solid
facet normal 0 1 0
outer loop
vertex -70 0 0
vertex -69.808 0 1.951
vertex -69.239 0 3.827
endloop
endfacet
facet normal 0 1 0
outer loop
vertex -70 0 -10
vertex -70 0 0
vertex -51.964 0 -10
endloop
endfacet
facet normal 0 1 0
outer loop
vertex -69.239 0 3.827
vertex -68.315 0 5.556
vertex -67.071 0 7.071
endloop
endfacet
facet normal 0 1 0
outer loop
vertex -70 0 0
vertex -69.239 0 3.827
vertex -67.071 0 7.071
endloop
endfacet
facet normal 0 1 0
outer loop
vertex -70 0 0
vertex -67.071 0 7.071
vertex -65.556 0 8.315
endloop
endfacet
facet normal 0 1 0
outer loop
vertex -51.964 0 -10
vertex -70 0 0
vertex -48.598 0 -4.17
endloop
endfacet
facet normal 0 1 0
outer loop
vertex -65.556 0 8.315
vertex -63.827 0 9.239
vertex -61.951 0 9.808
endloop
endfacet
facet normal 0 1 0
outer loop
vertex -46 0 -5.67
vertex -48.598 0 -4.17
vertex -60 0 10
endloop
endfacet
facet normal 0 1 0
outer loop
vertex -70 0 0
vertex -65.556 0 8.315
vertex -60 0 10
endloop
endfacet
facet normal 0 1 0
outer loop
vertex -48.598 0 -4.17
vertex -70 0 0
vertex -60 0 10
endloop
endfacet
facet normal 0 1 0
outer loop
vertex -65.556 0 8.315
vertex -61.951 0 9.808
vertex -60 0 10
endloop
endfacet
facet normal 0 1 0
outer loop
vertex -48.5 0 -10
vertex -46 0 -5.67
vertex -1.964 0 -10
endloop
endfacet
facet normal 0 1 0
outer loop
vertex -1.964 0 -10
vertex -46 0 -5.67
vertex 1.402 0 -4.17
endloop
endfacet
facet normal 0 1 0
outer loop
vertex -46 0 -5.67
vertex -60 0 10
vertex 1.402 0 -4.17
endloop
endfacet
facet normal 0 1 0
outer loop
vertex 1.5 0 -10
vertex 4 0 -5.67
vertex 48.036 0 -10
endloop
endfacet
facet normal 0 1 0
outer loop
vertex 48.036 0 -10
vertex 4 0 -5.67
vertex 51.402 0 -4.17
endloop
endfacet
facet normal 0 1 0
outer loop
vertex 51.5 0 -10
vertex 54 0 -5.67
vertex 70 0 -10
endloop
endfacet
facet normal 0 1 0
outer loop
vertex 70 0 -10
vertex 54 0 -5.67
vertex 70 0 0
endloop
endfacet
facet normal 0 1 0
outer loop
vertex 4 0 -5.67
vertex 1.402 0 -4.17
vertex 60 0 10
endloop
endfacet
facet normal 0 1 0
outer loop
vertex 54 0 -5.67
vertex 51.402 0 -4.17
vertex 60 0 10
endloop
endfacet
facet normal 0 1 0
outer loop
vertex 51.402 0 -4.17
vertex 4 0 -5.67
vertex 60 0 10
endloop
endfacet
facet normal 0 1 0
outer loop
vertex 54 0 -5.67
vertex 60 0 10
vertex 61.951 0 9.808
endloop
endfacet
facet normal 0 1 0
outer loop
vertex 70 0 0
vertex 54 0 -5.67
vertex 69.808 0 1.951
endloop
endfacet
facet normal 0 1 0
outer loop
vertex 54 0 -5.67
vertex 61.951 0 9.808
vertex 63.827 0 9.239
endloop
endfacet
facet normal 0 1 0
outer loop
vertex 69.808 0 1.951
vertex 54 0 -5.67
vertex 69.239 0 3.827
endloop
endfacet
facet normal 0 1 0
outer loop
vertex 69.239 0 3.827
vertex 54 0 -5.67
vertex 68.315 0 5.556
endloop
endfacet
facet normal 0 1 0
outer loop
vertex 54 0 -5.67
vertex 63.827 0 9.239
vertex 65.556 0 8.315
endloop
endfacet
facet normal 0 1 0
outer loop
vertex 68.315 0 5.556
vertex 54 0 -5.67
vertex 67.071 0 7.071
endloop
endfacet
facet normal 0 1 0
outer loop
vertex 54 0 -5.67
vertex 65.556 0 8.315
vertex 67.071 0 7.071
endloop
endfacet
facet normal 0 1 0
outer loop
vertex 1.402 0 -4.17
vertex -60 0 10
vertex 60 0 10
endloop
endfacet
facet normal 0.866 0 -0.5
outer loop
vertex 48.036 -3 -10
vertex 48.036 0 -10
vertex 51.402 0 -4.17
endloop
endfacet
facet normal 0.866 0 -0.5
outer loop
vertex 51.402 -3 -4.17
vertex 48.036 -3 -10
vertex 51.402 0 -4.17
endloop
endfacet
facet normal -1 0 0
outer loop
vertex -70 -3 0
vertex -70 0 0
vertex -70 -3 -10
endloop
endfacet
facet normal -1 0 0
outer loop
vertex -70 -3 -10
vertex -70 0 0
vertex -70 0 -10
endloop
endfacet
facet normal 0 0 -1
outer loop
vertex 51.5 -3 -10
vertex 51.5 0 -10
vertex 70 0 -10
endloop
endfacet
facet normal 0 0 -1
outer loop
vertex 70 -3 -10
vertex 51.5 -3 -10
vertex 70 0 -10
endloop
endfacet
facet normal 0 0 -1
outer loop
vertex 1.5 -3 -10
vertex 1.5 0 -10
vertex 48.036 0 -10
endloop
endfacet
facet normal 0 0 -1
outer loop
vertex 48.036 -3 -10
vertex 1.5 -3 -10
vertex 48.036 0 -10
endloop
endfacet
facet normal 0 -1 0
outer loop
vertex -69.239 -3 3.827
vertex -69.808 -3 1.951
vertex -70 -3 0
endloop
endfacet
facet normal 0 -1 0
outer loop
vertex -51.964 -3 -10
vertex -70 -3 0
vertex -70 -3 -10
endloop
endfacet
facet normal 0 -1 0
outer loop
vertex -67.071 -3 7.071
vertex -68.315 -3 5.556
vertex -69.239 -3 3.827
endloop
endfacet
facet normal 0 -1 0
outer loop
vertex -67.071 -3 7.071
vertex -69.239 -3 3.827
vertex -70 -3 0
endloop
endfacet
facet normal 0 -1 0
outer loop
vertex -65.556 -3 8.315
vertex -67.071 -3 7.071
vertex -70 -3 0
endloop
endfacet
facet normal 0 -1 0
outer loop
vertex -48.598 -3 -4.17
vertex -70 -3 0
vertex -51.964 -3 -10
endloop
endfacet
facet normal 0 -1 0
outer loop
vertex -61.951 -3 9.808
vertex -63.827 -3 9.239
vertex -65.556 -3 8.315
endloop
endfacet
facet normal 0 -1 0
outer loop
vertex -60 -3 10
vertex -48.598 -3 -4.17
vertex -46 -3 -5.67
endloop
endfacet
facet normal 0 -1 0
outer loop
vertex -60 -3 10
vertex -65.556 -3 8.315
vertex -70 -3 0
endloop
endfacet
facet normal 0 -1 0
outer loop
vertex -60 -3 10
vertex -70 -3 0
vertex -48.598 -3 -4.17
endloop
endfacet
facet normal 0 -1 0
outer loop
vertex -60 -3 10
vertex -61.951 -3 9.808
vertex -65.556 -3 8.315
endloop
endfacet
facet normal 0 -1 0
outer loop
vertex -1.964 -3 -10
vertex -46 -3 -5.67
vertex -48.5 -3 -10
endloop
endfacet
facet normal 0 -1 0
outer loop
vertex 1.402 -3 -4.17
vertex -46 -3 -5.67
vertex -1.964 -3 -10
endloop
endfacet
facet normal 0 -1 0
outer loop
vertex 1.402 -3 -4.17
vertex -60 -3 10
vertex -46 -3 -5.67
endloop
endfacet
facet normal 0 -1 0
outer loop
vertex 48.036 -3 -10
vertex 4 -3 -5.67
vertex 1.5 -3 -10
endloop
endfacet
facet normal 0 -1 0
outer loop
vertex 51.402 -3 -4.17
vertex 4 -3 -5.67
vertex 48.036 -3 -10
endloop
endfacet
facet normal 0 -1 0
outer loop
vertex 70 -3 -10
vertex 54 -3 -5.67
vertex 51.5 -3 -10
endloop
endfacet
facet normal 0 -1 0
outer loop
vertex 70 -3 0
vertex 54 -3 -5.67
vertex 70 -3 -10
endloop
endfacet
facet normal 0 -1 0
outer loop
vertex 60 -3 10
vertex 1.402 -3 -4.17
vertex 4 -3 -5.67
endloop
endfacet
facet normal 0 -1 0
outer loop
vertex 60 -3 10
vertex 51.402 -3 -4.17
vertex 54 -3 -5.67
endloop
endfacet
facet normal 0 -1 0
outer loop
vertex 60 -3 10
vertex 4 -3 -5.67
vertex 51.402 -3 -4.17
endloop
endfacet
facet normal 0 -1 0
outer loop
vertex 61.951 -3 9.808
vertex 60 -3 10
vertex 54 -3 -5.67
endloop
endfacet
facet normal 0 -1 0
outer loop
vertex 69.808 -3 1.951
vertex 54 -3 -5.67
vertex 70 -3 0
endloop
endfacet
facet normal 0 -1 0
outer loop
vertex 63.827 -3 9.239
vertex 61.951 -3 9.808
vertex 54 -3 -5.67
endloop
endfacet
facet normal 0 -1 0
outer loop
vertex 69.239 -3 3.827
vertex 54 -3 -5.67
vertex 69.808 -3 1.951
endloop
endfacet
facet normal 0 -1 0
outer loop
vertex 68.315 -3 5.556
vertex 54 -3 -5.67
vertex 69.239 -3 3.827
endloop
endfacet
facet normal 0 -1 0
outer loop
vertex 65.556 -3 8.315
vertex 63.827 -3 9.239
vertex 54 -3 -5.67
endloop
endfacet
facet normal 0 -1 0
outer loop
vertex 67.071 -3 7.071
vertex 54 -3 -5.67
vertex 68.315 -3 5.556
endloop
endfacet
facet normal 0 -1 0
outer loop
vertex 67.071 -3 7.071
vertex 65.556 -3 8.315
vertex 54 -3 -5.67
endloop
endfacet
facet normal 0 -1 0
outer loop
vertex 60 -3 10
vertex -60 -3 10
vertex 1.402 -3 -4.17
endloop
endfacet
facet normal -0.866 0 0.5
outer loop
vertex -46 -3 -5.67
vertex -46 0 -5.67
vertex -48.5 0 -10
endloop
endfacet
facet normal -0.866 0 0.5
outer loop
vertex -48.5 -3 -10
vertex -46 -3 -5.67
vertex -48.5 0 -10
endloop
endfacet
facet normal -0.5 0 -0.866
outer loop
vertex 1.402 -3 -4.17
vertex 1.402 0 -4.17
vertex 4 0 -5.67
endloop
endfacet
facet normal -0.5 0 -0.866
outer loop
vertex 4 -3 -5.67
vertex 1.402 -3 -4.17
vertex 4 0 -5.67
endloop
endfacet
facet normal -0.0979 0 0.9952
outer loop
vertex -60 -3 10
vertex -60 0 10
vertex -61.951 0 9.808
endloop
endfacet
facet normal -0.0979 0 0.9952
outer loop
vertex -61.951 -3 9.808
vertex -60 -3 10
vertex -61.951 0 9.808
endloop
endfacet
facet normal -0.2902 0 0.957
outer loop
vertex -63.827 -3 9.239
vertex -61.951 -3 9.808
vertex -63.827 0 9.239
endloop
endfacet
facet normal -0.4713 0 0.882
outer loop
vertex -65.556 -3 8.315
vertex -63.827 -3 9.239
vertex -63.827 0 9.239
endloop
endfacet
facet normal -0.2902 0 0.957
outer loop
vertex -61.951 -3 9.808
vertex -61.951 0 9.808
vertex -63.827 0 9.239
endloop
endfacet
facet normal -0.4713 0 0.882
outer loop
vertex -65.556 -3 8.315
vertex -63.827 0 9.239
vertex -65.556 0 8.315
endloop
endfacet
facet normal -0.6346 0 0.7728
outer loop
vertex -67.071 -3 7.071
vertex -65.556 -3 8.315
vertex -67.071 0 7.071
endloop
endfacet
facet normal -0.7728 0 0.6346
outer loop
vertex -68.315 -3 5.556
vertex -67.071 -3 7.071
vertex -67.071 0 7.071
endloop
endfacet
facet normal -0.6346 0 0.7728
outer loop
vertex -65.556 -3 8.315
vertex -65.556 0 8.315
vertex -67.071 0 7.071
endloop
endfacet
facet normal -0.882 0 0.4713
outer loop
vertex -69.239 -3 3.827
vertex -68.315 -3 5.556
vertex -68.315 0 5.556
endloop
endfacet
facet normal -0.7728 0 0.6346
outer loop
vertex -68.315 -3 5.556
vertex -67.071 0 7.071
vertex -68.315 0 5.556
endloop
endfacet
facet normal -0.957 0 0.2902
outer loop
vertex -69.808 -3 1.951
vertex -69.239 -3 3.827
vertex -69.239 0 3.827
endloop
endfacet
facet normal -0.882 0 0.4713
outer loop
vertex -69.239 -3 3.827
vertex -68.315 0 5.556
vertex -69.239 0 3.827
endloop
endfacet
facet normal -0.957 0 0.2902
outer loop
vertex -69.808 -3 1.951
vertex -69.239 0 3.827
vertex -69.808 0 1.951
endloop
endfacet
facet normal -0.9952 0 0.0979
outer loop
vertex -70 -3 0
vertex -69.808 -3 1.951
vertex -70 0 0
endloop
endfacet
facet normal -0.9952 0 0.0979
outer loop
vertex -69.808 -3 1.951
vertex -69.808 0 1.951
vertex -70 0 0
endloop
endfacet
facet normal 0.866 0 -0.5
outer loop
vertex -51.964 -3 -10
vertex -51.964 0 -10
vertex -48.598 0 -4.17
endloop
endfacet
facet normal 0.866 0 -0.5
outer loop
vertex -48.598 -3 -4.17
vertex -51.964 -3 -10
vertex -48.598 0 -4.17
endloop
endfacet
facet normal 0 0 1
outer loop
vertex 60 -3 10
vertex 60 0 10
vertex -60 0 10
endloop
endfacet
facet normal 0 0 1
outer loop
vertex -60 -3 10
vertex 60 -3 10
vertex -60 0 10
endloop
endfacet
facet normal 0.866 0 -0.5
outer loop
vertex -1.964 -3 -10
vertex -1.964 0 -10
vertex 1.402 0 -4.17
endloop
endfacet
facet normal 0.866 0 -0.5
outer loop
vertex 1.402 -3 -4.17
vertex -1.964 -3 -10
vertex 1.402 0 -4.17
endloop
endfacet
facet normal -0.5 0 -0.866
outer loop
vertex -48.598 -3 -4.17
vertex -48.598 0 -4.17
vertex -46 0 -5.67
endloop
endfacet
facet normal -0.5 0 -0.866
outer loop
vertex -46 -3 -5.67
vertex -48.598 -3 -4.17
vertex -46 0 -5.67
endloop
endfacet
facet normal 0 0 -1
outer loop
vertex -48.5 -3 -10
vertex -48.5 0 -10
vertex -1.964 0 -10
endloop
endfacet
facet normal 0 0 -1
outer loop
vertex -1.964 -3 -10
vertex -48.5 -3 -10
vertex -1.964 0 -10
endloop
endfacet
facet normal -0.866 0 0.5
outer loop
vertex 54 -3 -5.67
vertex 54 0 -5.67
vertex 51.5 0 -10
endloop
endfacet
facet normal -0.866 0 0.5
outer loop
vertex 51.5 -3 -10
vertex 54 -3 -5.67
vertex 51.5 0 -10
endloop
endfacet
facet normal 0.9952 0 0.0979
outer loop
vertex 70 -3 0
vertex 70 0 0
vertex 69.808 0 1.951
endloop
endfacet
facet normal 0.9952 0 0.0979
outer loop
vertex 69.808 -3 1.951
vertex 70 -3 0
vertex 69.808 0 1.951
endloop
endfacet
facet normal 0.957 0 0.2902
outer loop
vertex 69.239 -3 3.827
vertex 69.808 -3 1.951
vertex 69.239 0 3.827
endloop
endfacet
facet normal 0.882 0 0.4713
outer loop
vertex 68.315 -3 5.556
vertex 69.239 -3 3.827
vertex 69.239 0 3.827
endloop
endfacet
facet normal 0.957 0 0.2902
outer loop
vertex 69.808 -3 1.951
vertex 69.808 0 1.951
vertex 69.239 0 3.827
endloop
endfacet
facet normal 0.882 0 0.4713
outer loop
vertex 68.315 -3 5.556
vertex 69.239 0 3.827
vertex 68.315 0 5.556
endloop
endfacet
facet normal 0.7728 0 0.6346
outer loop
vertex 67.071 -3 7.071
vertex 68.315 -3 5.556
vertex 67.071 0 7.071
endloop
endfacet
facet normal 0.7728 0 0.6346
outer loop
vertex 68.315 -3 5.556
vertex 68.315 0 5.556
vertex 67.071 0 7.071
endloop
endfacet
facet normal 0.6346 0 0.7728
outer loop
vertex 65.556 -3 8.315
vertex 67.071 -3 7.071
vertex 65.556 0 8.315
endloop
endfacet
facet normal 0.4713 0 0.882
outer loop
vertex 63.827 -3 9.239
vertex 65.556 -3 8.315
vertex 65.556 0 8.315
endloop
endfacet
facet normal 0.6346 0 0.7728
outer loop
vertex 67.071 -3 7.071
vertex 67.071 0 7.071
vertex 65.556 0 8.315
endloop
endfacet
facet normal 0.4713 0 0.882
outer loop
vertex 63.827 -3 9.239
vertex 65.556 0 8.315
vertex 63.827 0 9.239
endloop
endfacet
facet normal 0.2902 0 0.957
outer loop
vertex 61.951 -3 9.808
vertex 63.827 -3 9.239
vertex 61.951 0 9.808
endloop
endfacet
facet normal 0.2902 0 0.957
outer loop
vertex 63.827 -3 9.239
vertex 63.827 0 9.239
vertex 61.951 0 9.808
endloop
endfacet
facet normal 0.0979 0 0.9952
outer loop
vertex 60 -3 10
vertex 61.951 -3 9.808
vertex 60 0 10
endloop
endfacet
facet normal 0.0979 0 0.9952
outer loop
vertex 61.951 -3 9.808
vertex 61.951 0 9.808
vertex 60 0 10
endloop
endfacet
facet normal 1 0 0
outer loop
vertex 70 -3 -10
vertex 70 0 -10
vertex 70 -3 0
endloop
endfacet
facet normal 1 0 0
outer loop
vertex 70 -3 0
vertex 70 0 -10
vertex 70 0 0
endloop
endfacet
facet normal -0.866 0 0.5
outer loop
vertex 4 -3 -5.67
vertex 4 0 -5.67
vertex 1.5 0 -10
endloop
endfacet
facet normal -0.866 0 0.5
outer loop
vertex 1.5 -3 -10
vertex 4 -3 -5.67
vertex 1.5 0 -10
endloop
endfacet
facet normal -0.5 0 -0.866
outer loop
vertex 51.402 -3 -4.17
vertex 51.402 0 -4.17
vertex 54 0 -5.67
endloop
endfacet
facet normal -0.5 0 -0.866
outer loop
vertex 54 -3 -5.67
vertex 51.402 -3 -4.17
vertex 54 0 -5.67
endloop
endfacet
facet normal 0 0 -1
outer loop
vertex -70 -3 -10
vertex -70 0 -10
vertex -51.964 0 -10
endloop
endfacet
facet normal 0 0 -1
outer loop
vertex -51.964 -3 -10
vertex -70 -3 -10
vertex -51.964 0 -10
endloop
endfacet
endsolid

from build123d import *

# Parameters (mm, degrees)
F1_DEPTH = 3


with BuildPart() as f1:
    # F0 (on Front) → F1 (new body)
    with BuildSketch(Plane.XZ):
        with BuildLine():
            Line((-70, 0), (-70, -10))
            Line((-70, -10), (-51.964102, -10))
            Line((-51.964102, -10), (-48.598076, -4.169873))
            Line((-48.598076, -4.169873), (-46, -5.669873))
            Line((-46, -5.669873), (-48.5, -10))
            Line((-48.5, -10), (-1.964102, -10))
            Line((-1.964102, -10), (1.401924, -4.169873))
            Line((1.401924, -4.169873), (4, -5.669873))
            Line((4, -5.669873), (1.5, -10))
            Line((1.5, -10), (48.035898, -10))
            Line((48.035898, -10), (51.401924, -4.169873))
            Line((51.401924, -4.169873), (54, -5.669873))
            Line((54, -5.669873), (51.5, -10))
            Line((51.5, -10), (70, -10))
            Line((70, -10), (70, 0))
            ThreePointArc((70, 0), (67.071068, 7.071068), (60, 10))
            Line((60, 10), (-60, 10))
            ThreePointArc((-60, 10), (-67.071068, 7.071068), (-70, 0))
        make_face()
    extrude(amount=F1_DEPTH)


solid = f1.part
